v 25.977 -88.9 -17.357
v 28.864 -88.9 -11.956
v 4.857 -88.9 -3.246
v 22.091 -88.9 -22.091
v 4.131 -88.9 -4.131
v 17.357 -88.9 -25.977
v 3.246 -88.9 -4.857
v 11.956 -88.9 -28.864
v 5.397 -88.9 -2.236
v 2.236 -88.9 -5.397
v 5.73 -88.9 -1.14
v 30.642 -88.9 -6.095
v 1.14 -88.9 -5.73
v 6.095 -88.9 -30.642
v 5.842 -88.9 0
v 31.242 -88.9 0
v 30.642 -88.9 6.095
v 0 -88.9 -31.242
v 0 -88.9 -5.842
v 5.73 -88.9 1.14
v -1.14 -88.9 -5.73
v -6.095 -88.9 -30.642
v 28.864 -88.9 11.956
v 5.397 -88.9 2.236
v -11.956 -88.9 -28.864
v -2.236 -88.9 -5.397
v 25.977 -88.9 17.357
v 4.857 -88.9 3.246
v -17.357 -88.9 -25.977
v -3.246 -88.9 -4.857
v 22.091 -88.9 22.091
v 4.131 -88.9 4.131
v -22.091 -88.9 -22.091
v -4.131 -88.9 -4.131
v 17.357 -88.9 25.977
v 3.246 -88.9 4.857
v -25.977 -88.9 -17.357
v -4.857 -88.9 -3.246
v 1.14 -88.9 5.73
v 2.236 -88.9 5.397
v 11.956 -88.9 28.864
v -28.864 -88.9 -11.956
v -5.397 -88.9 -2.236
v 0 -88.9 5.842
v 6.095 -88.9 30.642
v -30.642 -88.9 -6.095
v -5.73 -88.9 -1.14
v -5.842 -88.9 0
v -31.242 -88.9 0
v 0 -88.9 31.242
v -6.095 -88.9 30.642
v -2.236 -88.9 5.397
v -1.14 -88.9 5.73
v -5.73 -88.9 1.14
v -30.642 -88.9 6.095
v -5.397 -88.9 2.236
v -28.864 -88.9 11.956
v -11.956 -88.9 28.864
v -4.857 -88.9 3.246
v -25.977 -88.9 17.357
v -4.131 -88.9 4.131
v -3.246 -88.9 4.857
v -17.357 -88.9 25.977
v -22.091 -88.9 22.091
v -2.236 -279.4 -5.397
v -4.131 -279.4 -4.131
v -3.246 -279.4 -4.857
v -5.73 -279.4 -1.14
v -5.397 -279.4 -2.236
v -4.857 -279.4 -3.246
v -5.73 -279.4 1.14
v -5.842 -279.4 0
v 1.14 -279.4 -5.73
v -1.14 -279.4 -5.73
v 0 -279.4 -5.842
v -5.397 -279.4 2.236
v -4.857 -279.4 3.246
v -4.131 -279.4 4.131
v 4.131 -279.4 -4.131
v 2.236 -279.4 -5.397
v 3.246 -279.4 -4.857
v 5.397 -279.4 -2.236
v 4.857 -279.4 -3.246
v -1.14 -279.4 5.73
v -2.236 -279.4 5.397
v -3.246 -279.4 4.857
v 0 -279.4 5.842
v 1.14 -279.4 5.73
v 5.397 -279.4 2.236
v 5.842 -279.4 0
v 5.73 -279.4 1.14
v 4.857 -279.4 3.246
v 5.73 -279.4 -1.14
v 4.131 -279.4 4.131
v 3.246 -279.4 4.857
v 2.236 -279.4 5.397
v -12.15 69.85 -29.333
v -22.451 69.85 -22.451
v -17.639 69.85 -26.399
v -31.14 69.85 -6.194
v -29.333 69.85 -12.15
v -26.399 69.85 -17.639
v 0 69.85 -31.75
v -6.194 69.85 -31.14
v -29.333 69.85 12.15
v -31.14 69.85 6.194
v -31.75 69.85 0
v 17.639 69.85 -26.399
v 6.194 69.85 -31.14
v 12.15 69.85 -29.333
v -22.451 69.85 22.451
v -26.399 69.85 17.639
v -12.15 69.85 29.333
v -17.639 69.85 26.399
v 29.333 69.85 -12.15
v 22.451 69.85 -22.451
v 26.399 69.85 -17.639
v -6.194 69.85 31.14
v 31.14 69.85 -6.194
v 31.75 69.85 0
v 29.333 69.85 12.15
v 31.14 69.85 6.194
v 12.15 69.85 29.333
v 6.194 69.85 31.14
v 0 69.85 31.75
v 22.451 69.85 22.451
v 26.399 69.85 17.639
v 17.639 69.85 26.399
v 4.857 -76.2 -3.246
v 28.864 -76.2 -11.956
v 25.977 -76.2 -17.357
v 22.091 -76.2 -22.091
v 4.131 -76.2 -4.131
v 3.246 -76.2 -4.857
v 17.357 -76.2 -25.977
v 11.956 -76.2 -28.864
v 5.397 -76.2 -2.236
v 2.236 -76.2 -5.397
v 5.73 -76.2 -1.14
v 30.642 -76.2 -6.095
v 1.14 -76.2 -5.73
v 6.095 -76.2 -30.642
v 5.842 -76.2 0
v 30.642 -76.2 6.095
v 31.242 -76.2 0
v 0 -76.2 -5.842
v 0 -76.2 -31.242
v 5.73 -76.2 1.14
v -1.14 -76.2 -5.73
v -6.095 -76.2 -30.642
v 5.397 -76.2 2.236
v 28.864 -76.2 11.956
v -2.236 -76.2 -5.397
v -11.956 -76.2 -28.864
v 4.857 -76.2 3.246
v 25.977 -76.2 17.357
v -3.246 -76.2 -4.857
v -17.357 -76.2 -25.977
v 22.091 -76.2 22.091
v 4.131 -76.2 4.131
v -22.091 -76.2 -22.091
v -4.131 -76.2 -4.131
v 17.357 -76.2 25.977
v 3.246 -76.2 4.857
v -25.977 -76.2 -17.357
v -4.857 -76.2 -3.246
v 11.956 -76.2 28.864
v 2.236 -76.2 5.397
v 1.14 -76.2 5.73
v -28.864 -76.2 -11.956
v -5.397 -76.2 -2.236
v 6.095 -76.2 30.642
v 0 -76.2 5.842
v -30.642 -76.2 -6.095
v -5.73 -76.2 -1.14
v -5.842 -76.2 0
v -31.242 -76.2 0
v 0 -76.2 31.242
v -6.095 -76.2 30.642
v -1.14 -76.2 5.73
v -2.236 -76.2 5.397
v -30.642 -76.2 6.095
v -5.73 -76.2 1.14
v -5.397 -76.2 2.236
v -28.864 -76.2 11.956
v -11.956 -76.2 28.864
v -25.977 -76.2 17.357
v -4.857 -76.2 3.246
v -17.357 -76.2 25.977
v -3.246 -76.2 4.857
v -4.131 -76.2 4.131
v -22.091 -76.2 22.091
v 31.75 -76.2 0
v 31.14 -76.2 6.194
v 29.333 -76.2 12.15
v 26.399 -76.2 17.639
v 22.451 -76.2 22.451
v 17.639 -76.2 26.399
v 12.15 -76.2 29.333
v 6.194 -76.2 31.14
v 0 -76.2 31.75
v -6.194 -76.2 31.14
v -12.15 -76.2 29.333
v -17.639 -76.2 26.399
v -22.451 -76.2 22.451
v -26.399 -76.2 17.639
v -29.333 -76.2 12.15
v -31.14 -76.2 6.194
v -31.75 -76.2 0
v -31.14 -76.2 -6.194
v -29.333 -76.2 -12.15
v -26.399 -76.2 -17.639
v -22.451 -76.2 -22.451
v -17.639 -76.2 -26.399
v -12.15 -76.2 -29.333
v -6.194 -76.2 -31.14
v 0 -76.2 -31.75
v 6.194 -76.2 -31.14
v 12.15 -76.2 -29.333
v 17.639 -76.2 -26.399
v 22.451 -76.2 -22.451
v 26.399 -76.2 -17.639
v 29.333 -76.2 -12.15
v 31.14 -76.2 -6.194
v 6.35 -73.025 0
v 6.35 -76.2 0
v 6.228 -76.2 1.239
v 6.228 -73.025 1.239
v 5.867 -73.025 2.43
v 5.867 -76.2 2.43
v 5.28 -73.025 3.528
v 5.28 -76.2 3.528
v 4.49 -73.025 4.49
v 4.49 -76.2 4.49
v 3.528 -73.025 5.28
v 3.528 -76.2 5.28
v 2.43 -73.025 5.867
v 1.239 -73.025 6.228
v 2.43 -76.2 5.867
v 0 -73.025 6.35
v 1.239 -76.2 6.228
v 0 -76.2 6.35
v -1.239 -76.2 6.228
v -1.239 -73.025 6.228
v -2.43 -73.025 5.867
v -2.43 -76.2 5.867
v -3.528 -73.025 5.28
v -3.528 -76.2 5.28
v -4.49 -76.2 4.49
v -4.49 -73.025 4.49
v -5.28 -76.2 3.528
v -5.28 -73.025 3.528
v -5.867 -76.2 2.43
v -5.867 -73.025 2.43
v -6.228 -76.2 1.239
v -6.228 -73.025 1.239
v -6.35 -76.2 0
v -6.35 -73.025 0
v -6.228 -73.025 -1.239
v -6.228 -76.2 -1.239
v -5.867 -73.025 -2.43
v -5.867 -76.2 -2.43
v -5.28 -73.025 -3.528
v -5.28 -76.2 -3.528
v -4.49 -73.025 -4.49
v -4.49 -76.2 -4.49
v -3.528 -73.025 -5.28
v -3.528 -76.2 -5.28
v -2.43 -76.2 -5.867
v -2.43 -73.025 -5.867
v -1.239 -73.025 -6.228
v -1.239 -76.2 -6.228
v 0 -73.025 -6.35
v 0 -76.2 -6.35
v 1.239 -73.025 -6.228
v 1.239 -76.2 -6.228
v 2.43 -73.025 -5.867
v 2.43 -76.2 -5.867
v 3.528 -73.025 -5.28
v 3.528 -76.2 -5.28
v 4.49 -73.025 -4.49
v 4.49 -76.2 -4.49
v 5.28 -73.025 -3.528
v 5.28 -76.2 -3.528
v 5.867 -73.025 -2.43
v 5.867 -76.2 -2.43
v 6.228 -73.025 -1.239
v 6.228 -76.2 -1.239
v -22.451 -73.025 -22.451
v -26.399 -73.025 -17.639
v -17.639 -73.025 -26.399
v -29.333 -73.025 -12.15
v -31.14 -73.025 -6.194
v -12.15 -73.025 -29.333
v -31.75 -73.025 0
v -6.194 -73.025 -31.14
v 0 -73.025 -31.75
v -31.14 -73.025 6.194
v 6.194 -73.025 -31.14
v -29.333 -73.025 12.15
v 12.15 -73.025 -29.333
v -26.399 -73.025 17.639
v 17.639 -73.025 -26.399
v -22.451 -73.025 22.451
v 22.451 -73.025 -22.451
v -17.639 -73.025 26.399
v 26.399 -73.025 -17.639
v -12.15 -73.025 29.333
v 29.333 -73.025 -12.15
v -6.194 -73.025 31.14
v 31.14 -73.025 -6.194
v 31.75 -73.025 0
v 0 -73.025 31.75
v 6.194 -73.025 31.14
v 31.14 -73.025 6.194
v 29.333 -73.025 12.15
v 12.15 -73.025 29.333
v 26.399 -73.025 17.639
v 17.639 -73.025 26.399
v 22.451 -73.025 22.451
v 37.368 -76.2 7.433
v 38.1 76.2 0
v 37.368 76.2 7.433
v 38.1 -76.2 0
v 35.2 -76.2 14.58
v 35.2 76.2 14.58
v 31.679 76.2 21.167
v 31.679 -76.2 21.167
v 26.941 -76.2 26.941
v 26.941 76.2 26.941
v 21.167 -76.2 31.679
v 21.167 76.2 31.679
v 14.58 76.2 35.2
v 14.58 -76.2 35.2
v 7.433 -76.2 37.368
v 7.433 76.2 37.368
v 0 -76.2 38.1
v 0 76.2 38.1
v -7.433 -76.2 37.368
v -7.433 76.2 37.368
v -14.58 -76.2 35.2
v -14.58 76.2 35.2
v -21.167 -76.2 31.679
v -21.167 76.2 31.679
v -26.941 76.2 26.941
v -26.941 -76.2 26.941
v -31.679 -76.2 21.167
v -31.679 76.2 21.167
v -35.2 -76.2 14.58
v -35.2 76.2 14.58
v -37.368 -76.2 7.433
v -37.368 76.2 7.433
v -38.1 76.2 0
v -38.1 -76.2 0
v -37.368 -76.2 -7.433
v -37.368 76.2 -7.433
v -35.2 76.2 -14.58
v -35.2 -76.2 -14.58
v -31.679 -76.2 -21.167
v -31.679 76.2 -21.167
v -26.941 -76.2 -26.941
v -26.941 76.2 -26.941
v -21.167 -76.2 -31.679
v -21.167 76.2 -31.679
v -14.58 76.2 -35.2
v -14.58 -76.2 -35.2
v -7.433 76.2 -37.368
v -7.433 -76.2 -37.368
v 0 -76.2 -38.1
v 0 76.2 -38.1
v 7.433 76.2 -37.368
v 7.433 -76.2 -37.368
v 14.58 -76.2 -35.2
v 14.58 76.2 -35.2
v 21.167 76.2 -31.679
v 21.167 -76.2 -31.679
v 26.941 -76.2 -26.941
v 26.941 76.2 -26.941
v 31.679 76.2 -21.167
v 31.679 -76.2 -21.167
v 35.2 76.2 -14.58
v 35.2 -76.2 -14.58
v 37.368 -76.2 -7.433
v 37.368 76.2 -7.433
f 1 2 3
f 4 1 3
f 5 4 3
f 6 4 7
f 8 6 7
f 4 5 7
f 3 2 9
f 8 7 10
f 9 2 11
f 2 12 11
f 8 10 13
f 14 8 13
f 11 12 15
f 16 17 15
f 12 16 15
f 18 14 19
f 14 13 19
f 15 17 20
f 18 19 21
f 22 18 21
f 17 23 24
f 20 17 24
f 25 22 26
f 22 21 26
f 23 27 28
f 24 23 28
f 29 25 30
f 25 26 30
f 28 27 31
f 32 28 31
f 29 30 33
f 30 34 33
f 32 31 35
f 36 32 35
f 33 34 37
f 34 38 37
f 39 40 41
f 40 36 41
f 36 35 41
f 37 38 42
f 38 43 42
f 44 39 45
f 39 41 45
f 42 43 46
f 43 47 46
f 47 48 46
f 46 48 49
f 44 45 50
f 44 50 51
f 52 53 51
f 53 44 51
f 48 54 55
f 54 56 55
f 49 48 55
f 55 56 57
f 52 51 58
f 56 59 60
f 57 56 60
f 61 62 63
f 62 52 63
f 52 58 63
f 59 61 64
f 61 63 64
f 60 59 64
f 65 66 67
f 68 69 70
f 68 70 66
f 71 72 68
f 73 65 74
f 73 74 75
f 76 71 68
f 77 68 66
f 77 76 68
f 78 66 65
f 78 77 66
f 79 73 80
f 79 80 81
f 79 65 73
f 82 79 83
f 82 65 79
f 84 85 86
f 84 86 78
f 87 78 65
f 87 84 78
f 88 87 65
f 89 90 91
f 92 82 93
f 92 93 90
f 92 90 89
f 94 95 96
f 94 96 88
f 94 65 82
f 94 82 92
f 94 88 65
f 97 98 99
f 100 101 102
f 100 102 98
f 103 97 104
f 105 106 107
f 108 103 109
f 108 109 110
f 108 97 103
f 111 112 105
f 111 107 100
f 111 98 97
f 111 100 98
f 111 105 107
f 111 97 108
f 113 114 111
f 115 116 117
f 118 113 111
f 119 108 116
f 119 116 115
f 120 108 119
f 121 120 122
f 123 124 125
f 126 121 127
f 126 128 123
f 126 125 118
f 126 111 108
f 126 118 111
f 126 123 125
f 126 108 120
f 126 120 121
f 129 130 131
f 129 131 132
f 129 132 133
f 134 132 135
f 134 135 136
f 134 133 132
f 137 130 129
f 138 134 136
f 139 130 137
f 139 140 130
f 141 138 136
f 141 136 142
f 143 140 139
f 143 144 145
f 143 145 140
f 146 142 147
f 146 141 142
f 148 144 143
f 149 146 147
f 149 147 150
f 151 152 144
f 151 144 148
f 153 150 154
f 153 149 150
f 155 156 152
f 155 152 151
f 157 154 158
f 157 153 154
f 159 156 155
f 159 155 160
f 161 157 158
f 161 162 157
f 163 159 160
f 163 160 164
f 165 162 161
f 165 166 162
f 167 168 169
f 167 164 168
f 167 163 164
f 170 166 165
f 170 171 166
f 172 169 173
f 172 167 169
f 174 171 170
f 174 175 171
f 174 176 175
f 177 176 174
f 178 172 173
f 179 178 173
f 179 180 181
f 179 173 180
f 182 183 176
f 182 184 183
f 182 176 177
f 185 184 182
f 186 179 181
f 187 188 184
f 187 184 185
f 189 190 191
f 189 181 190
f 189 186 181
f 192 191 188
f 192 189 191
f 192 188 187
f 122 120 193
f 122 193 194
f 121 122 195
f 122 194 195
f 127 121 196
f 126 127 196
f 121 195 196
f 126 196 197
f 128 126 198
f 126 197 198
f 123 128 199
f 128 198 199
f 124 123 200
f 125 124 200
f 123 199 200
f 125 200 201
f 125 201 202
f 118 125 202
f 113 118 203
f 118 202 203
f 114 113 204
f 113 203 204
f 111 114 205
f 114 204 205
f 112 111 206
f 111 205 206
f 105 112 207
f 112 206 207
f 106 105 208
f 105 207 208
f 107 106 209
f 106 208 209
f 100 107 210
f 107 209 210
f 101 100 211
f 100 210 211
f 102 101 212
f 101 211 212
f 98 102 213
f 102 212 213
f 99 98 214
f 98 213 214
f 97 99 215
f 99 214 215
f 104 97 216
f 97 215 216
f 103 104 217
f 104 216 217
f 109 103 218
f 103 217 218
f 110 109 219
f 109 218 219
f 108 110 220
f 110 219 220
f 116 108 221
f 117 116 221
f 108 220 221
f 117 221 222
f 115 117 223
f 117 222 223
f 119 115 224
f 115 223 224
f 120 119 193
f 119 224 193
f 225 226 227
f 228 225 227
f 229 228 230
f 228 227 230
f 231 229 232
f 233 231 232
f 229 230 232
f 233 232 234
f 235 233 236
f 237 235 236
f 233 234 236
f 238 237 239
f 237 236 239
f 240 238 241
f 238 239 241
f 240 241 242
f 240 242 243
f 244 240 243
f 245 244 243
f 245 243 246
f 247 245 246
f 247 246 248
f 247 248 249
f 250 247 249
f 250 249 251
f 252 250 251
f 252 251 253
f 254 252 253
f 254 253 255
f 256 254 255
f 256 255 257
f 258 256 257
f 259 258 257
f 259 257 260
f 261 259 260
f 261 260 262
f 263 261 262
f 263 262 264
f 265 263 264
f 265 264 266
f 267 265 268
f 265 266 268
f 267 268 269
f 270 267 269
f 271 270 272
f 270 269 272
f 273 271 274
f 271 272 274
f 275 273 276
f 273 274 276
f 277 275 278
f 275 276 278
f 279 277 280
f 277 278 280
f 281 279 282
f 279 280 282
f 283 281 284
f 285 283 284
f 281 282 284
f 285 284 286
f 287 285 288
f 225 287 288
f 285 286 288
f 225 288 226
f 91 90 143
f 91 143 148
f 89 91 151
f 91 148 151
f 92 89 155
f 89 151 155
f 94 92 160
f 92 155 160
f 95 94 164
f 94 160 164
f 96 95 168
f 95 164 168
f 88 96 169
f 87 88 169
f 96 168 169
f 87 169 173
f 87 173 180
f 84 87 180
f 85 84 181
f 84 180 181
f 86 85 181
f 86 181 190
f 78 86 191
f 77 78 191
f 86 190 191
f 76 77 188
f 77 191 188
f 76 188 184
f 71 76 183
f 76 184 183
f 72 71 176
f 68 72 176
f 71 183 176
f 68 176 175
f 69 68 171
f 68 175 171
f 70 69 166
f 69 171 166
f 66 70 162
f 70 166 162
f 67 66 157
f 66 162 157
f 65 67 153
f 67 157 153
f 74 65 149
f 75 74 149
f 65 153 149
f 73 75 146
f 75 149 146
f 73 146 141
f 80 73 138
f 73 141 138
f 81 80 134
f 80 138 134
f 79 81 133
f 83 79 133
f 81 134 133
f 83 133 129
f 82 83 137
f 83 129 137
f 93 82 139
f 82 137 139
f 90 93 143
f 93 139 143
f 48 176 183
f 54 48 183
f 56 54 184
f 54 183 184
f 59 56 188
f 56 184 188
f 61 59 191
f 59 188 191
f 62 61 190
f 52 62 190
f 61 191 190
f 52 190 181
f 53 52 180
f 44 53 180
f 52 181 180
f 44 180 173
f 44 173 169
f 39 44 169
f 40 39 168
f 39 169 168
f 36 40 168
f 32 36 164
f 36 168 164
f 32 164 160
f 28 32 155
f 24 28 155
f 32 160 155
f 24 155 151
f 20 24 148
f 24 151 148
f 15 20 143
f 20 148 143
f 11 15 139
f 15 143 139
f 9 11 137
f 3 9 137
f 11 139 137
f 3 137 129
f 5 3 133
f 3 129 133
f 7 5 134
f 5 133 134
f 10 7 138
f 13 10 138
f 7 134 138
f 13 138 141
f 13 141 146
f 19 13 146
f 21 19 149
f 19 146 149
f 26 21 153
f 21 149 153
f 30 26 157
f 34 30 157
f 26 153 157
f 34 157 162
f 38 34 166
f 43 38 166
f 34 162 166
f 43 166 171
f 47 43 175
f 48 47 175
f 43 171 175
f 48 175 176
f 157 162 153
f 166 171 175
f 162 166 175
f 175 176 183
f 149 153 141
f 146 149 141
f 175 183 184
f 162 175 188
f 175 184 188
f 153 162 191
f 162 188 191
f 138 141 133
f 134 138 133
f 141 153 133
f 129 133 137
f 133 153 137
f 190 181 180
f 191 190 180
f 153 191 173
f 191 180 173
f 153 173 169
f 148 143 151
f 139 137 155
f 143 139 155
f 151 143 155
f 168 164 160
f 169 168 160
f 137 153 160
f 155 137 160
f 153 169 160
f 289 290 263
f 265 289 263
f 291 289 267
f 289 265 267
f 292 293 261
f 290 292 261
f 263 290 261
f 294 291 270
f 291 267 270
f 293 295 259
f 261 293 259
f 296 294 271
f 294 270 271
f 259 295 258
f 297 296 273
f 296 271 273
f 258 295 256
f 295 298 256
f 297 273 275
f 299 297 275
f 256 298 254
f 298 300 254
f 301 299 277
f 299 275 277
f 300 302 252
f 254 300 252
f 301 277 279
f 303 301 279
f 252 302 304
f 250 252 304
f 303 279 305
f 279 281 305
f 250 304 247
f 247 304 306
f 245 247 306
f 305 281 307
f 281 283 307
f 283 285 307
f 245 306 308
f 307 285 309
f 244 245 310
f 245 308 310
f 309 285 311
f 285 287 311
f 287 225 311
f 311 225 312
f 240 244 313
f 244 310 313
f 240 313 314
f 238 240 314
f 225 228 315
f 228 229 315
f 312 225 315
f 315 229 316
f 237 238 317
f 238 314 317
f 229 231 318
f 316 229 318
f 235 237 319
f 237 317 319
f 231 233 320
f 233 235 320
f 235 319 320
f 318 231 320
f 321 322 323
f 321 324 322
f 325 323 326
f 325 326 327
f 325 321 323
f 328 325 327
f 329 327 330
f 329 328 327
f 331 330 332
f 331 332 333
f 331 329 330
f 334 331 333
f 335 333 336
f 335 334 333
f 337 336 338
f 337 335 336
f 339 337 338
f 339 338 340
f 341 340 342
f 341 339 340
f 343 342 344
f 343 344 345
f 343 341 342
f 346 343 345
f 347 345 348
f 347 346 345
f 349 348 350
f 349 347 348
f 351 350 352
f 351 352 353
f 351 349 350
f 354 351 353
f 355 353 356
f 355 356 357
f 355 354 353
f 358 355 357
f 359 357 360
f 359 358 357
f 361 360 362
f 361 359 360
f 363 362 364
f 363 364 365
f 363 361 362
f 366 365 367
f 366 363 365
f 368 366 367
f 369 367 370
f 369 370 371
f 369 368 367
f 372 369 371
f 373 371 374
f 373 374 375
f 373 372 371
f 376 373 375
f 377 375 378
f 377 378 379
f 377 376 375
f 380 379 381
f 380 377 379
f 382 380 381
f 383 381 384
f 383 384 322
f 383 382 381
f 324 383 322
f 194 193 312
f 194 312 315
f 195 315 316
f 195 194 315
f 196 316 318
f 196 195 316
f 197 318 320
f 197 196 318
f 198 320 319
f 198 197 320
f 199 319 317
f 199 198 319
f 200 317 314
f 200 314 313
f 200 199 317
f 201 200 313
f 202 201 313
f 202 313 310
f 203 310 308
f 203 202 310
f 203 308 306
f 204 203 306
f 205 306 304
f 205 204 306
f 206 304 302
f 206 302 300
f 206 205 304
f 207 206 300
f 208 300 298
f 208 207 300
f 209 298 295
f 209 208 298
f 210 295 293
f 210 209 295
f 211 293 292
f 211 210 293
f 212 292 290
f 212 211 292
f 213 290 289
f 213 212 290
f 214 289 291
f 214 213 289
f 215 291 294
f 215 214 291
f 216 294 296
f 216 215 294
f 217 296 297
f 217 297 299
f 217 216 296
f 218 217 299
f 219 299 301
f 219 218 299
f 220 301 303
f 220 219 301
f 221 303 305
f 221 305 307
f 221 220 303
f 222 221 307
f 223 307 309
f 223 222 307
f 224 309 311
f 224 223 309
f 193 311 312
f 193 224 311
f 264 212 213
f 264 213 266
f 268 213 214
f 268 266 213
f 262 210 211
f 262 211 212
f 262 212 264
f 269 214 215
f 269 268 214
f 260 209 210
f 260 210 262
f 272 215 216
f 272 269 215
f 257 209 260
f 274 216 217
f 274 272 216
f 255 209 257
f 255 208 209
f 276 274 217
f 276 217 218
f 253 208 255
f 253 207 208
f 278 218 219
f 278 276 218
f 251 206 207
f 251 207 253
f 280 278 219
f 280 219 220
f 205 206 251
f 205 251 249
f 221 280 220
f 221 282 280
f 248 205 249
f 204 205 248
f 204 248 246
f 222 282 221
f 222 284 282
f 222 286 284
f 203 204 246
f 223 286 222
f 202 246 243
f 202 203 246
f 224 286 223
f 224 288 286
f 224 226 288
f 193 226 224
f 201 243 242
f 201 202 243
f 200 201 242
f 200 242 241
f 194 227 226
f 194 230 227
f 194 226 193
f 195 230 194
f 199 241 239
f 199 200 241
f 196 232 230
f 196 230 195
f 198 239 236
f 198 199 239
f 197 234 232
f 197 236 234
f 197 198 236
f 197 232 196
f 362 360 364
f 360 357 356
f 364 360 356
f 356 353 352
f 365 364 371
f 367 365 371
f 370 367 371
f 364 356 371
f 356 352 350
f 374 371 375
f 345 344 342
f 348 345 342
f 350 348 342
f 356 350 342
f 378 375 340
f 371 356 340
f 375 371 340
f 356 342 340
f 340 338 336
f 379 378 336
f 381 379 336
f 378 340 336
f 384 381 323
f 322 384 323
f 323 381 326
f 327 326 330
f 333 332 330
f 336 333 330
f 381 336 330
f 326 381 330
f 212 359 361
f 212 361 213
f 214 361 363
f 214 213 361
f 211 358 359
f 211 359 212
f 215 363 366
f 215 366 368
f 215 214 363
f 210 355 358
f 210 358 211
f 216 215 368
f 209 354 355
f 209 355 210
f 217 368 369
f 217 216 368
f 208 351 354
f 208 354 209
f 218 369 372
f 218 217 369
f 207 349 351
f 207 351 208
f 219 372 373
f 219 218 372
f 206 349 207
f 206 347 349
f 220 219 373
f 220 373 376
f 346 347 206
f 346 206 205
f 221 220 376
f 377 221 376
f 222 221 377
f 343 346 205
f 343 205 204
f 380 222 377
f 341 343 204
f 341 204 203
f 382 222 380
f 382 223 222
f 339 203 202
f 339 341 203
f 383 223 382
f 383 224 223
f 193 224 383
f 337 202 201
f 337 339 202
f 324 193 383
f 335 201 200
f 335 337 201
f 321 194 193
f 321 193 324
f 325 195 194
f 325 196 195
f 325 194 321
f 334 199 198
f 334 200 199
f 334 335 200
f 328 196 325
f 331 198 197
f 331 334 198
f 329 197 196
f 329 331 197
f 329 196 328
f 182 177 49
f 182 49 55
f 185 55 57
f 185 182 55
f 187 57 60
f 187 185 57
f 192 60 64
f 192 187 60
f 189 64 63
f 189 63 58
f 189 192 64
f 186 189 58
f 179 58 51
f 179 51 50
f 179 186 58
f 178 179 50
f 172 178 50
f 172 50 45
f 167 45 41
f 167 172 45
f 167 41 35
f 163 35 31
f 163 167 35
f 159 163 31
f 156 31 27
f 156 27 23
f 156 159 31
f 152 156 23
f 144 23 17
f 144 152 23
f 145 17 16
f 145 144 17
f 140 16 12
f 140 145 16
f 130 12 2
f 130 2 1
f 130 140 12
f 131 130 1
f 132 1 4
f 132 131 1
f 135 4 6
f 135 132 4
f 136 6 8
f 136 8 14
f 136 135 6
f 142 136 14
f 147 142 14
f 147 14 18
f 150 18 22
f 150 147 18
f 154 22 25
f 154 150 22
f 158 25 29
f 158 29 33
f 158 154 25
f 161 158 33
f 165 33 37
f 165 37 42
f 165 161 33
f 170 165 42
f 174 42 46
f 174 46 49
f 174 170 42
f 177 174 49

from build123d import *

# Parameters (mm, degrees)
F0_R      = 38.1
F1_DEPTH  = 76.2
F2_T      = -6.35
F3_R      = 31.75
F4_DEPTH  = 3.175
F5_R      = 6.35
F6_DEPTH  = 152.401
F7_R      = 5.842
F8_DEPTH  = 203.2
F9_R      = 31.242
F9_R_2    = 5.842
F10_DEPTH = 12.7


with BuildPart() as f1:
    # F0 (on Front) → F1 (new body, symmetric)
    with BuildSketch(Plane.XZ):
        Circle(F0_R)
    extrude(amount=F1_DEPTH, both=True)

    # F2
    f2_openings = [f1.faces().sort_by_distance(p)[0] for p in [
        (0, -76.2, 0),
    ]]
    offset(amount=F2_T, openings=f2_openings)


with BuildPart() as f4:
    # F3 (on face) → F4 (new body)
    with BuildSketch(Plane.XZ.offset(76.2)):
        Circle(F3_R)
    extrude(amount=-F4_DEPTH)

    # F5 (on face) → F6 (cut, through all)
    with BuildSketch(Plane.XZ.offset(76.2)):
        Circle(F5_R)
    extrude(amount=-F6_DEPTH, mode=Mode.SUBTRACT)


with BuildPart() as f8:
    # F7 (on face) → F8 (new body)
    with BuildSketch(Plane.XZ.offset(76.2)):
        Circle(F7_R)
    extrude(amount=F8_DEPTH)


with BuildPart() as f10:
    # F9 (on face) → F10 (new body)
    with BuildSketch(Plane(origin=(0, -76.2, 0), x_dir=(-1, 0, 0), z_dir=(0, 1, 0))):
        Circle(F9_R)
        Circle(F9_R_2, mode=Mode.SUBTRACT)
    extrude(amount=-F10_DEPTH)


solid = Compound([f1.part, f4.part, f8.part, f10.part])
